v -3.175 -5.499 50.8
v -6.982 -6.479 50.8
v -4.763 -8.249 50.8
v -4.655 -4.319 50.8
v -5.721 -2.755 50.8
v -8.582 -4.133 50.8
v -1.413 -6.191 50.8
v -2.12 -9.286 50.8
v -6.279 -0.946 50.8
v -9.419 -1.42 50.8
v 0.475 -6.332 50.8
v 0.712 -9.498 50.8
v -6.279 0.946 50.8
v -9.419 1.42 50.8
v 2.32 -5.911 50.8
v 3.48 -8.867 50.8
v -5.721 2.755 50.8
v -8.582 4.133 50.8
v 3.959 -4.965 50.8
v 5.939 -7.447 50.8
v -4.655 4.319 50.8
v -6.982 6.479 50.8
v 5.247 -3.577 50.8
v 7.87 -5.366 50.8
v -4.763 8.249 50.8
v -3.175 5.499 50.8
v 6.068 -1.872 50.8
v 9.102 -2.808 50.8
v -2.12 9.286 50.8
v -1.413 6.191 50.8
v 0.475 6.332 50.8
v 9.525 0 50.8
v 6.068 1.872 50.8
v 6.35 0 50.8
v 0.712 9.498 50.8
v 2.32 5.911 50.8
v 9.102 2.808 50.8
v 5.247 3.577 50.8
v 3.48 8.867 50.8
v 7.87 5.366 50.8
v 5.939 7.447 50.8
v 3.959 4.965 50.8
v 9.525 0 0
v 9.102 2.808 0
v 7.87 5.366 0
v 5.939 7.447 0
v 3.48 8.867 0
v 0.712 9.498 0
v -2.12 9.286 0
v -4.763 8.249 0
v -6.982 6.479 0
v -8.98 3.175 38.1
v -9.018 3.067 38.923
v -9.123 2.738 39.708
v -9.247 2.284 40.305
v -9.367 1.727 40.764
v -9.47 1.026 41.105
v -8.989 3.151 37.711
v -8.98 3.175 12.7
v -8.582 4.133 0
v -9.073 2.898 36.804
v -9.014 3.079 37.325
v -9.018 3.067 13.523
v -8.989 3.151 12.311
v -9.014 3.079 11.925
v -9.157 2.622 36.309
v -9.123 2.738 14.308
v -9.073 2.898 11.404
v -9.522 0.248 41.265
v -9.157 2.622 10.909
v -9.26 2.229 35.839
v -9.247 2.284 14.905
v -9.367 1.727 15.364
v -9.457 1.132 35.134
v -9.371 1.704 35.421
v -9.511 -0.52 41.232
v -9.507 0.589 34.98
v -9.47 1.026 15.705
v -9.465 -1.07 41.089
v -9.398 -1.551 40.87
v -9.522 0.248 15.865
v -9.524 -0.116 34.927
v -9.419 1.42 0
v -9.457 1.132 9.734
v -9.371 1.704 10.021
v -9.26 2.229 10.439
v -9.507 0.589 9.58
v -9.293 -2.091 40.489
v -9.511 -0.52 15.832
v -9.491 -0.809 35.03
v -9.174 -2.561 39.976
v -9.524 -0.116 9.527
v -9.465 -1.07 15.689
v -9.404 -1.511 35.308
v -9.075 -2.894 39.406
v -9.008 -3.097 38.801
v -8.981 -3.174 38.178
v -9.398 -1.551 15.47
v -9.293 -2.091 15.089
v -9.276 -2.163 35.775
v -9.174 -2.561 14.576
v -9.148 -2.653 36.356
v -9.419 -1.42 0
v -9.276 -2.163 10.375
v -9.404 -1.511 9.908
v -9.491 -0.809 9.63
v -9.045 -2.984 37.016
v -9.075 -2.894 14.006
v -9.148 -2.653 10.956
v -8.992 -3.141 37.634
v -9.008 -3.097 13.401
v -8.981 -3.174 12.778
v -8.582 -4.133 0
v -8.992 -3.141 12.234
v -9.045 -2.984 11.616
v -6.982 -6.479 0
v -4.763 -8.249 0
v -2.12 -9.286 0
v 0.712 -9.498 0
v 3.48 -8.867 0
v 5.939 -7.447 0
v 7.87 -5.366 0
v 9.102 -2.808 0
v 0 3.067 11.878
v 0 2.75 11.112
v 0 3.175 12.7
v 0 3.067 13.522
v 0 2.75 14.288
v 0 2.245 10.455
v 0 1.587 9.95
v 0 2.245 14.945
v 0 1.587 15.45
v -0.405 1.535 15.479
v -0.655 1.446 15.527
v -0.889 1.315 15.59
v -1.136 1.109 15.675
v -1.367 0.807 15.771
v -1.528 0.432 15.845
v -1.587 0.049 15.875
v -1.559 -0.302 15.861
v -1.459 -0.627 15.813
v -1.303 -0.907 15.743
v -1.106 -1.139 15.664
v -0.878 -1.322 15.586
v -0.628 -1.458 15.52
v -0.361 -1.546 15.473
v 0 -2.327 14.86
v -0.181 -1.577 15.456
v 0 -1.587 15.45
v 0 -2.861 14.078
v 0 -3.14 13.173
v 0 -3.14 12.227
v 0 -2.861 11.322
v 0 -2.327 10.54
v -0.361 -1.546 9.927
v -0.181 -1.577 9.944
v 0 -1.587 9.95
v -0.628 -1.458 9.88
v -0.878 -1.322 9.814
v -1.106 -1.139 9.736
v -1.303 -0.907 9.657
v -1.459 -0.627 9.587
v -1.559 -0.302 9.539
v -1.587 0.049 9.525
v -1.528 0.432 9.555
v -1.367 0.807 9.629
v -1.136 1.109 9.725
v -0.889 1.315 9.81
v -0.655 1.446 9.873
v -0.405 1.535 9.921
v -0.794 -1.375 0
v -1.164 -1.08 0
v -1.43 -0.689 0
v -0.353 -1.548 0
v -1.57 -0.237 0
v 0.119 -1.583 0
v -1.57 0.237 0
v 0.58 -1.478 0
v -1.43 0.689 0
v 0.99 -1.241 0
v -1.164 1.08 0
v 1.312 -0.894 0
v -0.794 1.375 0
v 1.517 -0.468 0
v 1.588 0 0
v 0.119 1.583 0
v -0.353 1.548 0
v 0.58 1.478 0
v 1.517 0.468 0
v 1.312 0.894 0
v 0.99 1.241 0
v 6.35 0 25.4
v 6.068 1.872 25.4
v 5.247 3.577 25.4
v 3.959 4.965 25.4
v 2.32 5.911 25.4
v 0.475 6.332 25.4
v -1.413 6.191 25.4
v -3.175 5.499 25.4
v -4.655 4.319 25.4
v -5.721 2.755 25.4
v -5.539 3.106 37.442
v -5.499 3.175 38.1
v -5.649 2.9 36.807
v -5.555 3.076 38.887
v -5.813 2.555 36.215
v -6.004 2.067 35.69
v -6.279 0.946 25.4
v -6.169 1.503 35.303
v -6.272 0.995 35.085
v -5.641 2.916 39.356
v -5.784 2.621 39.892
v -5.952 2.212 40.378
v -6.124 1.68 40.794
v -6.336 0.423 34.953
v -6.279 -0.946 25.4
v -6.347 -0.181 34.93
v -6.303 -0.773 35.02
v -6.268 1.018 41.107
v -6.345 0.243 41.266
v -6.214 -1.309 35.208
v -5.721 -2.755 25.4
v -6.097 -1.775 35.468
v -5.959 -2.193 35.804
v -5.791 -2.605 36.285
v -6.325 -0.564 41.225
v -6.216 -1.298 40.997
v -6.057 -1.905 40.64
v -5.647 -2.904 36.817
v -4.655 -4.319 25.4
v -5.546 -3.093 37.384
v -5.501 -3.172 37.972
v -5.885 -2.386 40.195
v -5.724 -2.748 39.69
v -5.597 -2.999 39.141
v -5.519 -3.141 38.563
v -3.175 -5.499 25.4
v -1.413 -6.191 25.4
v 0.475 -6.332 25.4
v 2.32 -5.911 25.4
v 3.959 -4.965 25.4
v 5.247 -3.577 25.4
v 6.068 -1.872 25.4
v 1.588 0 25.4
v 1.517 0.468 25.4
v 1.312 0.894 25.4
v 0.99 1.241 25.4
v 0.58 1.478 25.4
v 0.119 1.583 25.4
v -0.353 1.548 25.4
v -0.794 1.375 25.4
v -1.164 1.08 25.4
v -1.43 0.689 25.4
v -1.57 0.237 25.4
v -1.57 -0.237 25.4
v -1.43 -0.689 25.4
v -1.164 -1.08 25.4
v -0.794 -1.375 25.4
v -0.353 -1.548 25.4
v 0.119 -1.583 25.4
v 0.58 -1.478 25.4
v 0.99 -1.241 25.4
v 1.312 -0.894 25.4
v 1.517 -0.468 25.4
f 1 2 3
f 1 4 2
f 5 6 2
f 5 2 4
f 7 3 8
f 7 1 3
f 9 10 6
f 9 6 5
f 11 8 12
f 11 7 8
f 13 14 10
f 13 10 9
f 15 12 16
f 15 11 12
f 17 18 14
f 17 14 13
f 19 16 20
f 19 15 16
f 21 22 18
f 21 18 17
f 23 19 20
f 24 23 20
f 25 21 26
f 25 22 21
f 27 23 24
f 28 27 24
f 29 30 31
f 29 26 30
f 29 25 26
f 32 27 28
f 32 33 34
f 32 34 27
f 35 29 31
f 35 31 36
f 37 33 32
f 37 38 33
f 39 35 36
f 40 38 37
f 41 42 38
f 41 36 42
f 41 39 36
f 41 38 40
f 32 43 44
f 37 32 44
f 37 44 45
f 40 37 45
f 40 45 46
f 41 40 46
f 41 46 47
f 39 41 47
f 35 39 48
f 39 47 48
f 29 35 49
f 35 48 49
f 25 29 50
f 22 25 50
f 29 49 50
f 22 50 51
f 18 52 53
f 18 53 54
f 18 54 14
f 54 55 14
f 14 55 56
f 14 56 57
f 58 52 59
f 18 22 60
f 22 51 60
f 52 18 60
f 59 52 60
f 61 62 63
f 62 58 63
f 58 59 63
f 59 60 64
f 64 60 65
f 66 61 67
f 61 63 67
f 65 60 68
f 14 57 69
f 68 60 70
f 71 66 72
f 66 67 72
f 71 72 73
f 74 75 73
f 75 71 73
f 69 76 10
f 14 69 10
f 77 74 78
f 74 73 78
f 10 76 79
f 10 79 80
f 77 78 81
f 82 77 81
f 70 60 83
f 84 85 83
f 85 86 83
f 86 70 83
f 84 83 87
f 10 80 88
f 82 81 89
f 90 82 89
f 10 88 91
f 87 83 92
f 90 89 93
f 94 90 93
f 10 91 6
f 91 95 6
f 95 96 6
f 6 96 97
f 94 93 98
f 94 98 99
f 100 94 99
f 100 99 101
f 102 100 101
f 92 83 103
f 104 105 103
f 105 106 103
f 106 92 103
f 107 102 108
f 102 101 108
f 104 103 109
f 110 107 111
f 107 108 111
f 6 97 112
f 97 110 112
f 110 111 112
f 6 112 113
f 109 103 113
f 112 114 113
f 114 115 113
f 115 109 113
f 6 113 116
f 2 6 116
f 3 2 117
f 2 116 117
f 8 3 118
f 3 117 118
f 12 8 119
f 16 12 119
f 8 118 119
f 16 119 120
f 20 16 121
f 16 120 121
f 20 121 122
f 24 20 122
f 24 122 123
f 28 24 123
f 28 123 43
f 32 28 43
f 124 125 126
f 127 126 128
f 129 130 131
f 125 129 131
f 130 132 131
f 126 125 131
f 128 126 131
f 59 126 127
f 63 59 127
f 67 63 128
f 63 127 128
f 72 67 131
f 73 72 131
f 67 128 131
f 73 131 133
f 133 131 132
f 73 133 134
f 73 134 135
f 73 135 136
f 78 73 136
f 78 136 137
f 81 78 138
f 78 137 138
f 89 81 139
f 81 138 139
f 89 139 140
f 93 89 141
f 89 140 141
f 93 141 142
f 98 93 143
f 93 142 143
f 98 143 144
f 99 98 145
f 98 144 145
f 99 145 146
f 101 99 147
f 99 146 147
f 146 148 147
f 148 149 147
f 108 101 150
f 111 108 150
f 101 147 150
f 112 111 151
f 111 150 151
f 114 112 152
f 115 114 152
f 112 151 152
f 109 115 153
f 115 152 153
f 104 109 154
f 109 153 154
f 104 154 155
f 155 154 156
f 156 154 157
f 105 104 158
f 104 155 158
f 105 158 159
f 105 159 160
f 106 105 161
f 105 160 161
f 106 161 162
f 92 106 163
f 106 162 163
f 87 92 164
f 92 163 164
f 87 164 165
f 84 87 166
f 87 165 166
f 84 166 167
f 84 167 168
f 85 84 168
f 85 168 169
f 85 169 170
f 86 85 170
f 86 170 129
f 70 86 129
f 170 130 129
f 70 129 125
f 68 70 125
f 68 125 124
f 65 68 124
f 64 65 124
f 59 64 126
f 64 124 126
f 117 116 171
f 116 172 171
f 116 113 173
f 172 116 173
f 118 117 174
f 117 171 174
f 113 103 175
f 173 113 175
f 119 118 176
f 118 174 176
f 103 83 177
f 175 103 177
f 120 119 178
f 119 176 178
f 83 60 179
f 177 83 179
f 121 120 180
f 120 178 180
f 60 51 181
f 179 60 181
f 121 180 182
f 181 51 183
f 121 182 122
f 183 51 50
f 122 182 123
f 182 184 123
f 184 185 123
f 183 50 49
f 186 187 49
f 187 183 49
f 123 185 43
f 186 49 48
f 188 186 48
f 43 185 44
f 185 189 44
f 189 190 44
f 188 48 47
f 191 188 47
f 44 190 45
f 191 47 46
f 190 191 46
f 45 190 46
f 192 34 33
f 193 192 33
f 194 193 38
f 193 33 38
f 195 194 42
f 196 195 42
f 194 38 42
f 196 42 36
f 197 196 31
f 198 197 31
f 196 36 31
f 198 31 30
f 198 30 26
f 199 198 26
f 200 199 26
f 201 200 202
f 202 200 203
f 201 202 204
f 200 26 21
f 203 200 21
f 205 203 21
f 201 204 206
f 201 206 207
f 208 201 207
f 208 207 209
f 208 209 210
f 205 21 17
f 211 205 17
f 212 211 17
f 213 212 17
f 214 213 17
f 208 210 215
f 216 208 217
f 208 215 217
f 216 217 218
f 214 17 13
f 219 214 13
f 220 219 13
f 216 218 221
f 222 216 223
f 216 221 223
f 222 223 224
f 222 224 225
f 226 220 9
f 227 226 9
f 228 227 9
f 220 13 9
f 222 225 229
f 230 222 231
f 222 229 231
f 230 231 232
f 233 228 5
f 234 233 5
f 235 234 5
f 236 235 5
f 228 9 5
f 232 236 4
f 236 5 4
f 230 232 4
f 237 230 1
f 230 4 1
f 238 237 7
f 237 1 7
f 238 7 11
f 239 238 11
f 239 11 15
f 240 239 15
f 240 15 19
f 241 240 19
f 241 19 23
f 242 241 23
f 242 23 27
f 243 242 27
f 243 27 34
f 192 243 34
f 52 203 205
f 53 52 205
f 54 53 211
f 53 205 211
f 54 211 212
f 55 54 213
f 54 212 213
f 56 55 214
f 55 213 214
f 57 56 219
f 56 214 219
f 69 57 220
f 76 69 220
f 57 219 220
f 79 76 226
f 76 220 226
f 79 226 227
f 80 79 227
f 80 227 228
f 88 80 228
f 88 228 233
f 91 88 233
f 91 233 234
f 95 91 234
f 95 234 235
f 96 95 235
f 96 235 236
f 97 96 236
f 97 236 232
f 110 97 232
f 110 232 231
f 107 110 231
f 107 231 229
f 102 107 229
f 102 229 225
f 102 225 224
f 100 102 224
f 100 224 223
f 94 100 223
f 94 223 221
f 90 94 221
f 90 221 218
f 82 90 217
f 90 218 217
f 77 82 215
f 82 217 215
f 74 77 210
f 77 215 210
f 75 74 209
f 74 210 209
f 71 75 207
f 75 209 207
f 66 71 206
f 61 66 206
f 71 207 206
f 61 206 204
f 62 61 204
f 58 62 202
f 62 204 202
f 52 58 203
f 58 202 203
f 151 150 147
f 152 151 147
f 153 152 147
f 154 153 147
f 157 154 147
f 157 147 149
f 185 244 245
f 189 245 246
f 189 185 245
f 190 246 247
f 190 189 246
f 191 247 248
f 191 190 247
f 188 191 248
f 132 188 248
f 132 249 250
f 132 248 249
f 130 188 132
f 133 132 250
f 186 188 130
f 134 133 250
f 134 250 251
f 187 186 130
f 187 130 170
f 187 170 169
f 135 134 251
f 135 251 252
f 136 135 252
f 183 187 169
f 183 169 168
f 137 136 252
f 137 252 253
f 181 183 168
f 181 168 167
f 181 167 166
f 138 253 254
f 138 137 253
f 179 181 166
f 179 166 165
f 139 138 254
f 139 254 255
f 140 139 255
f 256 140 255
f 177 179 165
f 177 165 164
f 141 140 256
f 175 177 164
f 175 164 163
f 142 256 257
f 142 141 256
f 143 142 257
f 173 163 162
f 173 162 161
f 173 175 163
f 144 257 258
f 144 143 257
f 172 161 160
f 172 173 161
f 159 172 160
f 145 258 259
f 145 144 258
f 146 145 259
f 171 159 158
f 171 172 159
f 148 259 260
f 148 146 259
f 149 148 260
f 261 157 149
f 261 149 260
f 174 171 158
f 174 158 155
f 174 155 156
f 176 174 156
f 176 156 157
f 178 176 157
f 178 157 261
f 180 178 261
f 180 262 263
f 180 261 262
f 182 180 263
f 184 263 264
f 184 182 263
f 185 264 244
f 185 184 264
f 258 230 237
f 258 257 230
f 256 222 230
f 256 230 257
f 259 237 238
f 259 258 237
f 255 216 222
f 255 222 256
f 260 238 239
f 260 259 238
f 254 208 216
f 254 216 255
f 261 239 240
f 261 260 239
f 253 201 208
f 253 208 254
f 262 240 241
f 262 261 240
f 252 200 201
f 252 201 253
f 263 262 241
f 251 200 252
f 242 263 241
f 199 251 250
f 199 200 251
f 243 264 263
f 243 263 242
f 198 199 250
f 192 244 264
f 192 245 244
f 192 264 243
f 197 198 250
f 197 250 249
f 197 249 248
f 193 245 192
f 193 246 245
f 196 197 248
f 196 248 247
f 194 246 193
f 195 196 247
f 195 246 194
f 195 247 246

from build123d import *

# Parameters (mm, degrees)
F0_R     = 9.525
F0_R_2   = 1.5875
F1_DEPTH = 50.8
F2_R     = 6.35
F3_DEPTH = 25.4
F4_R     = 3.175
F5_DEPTH = 9.526


with BuildPart() as f1:
    # F0 (on Top) → F1 (new body)
    with BuildSketch(Plane.XY):
        Circle(F0_R)
        Circle(F0_R_2, mode=Mode.SUBTRACT)
    extrude(amount=F1_DEPTH)

    # F2 (on face) → F3 (cut)
    with BuildSketch(Plane.XY.offset(50.8)):
        Circle(F2_R)
    extrude(amount=-F3_DEPTH, mode=Mode.SUBTRACT)

    # F4 (on Right) → F5 (cut, through all)
    with BuildSketch(Plane.YZ):
        with Locations((0, 12.7)):
            Circle(F4_R)
        with Locations((0, 38.1)):
            Circle(F4_R)
    extrude(amount=-F5_DEPTH, mode=Mode.SUBTRACT)


solid = f1.part
